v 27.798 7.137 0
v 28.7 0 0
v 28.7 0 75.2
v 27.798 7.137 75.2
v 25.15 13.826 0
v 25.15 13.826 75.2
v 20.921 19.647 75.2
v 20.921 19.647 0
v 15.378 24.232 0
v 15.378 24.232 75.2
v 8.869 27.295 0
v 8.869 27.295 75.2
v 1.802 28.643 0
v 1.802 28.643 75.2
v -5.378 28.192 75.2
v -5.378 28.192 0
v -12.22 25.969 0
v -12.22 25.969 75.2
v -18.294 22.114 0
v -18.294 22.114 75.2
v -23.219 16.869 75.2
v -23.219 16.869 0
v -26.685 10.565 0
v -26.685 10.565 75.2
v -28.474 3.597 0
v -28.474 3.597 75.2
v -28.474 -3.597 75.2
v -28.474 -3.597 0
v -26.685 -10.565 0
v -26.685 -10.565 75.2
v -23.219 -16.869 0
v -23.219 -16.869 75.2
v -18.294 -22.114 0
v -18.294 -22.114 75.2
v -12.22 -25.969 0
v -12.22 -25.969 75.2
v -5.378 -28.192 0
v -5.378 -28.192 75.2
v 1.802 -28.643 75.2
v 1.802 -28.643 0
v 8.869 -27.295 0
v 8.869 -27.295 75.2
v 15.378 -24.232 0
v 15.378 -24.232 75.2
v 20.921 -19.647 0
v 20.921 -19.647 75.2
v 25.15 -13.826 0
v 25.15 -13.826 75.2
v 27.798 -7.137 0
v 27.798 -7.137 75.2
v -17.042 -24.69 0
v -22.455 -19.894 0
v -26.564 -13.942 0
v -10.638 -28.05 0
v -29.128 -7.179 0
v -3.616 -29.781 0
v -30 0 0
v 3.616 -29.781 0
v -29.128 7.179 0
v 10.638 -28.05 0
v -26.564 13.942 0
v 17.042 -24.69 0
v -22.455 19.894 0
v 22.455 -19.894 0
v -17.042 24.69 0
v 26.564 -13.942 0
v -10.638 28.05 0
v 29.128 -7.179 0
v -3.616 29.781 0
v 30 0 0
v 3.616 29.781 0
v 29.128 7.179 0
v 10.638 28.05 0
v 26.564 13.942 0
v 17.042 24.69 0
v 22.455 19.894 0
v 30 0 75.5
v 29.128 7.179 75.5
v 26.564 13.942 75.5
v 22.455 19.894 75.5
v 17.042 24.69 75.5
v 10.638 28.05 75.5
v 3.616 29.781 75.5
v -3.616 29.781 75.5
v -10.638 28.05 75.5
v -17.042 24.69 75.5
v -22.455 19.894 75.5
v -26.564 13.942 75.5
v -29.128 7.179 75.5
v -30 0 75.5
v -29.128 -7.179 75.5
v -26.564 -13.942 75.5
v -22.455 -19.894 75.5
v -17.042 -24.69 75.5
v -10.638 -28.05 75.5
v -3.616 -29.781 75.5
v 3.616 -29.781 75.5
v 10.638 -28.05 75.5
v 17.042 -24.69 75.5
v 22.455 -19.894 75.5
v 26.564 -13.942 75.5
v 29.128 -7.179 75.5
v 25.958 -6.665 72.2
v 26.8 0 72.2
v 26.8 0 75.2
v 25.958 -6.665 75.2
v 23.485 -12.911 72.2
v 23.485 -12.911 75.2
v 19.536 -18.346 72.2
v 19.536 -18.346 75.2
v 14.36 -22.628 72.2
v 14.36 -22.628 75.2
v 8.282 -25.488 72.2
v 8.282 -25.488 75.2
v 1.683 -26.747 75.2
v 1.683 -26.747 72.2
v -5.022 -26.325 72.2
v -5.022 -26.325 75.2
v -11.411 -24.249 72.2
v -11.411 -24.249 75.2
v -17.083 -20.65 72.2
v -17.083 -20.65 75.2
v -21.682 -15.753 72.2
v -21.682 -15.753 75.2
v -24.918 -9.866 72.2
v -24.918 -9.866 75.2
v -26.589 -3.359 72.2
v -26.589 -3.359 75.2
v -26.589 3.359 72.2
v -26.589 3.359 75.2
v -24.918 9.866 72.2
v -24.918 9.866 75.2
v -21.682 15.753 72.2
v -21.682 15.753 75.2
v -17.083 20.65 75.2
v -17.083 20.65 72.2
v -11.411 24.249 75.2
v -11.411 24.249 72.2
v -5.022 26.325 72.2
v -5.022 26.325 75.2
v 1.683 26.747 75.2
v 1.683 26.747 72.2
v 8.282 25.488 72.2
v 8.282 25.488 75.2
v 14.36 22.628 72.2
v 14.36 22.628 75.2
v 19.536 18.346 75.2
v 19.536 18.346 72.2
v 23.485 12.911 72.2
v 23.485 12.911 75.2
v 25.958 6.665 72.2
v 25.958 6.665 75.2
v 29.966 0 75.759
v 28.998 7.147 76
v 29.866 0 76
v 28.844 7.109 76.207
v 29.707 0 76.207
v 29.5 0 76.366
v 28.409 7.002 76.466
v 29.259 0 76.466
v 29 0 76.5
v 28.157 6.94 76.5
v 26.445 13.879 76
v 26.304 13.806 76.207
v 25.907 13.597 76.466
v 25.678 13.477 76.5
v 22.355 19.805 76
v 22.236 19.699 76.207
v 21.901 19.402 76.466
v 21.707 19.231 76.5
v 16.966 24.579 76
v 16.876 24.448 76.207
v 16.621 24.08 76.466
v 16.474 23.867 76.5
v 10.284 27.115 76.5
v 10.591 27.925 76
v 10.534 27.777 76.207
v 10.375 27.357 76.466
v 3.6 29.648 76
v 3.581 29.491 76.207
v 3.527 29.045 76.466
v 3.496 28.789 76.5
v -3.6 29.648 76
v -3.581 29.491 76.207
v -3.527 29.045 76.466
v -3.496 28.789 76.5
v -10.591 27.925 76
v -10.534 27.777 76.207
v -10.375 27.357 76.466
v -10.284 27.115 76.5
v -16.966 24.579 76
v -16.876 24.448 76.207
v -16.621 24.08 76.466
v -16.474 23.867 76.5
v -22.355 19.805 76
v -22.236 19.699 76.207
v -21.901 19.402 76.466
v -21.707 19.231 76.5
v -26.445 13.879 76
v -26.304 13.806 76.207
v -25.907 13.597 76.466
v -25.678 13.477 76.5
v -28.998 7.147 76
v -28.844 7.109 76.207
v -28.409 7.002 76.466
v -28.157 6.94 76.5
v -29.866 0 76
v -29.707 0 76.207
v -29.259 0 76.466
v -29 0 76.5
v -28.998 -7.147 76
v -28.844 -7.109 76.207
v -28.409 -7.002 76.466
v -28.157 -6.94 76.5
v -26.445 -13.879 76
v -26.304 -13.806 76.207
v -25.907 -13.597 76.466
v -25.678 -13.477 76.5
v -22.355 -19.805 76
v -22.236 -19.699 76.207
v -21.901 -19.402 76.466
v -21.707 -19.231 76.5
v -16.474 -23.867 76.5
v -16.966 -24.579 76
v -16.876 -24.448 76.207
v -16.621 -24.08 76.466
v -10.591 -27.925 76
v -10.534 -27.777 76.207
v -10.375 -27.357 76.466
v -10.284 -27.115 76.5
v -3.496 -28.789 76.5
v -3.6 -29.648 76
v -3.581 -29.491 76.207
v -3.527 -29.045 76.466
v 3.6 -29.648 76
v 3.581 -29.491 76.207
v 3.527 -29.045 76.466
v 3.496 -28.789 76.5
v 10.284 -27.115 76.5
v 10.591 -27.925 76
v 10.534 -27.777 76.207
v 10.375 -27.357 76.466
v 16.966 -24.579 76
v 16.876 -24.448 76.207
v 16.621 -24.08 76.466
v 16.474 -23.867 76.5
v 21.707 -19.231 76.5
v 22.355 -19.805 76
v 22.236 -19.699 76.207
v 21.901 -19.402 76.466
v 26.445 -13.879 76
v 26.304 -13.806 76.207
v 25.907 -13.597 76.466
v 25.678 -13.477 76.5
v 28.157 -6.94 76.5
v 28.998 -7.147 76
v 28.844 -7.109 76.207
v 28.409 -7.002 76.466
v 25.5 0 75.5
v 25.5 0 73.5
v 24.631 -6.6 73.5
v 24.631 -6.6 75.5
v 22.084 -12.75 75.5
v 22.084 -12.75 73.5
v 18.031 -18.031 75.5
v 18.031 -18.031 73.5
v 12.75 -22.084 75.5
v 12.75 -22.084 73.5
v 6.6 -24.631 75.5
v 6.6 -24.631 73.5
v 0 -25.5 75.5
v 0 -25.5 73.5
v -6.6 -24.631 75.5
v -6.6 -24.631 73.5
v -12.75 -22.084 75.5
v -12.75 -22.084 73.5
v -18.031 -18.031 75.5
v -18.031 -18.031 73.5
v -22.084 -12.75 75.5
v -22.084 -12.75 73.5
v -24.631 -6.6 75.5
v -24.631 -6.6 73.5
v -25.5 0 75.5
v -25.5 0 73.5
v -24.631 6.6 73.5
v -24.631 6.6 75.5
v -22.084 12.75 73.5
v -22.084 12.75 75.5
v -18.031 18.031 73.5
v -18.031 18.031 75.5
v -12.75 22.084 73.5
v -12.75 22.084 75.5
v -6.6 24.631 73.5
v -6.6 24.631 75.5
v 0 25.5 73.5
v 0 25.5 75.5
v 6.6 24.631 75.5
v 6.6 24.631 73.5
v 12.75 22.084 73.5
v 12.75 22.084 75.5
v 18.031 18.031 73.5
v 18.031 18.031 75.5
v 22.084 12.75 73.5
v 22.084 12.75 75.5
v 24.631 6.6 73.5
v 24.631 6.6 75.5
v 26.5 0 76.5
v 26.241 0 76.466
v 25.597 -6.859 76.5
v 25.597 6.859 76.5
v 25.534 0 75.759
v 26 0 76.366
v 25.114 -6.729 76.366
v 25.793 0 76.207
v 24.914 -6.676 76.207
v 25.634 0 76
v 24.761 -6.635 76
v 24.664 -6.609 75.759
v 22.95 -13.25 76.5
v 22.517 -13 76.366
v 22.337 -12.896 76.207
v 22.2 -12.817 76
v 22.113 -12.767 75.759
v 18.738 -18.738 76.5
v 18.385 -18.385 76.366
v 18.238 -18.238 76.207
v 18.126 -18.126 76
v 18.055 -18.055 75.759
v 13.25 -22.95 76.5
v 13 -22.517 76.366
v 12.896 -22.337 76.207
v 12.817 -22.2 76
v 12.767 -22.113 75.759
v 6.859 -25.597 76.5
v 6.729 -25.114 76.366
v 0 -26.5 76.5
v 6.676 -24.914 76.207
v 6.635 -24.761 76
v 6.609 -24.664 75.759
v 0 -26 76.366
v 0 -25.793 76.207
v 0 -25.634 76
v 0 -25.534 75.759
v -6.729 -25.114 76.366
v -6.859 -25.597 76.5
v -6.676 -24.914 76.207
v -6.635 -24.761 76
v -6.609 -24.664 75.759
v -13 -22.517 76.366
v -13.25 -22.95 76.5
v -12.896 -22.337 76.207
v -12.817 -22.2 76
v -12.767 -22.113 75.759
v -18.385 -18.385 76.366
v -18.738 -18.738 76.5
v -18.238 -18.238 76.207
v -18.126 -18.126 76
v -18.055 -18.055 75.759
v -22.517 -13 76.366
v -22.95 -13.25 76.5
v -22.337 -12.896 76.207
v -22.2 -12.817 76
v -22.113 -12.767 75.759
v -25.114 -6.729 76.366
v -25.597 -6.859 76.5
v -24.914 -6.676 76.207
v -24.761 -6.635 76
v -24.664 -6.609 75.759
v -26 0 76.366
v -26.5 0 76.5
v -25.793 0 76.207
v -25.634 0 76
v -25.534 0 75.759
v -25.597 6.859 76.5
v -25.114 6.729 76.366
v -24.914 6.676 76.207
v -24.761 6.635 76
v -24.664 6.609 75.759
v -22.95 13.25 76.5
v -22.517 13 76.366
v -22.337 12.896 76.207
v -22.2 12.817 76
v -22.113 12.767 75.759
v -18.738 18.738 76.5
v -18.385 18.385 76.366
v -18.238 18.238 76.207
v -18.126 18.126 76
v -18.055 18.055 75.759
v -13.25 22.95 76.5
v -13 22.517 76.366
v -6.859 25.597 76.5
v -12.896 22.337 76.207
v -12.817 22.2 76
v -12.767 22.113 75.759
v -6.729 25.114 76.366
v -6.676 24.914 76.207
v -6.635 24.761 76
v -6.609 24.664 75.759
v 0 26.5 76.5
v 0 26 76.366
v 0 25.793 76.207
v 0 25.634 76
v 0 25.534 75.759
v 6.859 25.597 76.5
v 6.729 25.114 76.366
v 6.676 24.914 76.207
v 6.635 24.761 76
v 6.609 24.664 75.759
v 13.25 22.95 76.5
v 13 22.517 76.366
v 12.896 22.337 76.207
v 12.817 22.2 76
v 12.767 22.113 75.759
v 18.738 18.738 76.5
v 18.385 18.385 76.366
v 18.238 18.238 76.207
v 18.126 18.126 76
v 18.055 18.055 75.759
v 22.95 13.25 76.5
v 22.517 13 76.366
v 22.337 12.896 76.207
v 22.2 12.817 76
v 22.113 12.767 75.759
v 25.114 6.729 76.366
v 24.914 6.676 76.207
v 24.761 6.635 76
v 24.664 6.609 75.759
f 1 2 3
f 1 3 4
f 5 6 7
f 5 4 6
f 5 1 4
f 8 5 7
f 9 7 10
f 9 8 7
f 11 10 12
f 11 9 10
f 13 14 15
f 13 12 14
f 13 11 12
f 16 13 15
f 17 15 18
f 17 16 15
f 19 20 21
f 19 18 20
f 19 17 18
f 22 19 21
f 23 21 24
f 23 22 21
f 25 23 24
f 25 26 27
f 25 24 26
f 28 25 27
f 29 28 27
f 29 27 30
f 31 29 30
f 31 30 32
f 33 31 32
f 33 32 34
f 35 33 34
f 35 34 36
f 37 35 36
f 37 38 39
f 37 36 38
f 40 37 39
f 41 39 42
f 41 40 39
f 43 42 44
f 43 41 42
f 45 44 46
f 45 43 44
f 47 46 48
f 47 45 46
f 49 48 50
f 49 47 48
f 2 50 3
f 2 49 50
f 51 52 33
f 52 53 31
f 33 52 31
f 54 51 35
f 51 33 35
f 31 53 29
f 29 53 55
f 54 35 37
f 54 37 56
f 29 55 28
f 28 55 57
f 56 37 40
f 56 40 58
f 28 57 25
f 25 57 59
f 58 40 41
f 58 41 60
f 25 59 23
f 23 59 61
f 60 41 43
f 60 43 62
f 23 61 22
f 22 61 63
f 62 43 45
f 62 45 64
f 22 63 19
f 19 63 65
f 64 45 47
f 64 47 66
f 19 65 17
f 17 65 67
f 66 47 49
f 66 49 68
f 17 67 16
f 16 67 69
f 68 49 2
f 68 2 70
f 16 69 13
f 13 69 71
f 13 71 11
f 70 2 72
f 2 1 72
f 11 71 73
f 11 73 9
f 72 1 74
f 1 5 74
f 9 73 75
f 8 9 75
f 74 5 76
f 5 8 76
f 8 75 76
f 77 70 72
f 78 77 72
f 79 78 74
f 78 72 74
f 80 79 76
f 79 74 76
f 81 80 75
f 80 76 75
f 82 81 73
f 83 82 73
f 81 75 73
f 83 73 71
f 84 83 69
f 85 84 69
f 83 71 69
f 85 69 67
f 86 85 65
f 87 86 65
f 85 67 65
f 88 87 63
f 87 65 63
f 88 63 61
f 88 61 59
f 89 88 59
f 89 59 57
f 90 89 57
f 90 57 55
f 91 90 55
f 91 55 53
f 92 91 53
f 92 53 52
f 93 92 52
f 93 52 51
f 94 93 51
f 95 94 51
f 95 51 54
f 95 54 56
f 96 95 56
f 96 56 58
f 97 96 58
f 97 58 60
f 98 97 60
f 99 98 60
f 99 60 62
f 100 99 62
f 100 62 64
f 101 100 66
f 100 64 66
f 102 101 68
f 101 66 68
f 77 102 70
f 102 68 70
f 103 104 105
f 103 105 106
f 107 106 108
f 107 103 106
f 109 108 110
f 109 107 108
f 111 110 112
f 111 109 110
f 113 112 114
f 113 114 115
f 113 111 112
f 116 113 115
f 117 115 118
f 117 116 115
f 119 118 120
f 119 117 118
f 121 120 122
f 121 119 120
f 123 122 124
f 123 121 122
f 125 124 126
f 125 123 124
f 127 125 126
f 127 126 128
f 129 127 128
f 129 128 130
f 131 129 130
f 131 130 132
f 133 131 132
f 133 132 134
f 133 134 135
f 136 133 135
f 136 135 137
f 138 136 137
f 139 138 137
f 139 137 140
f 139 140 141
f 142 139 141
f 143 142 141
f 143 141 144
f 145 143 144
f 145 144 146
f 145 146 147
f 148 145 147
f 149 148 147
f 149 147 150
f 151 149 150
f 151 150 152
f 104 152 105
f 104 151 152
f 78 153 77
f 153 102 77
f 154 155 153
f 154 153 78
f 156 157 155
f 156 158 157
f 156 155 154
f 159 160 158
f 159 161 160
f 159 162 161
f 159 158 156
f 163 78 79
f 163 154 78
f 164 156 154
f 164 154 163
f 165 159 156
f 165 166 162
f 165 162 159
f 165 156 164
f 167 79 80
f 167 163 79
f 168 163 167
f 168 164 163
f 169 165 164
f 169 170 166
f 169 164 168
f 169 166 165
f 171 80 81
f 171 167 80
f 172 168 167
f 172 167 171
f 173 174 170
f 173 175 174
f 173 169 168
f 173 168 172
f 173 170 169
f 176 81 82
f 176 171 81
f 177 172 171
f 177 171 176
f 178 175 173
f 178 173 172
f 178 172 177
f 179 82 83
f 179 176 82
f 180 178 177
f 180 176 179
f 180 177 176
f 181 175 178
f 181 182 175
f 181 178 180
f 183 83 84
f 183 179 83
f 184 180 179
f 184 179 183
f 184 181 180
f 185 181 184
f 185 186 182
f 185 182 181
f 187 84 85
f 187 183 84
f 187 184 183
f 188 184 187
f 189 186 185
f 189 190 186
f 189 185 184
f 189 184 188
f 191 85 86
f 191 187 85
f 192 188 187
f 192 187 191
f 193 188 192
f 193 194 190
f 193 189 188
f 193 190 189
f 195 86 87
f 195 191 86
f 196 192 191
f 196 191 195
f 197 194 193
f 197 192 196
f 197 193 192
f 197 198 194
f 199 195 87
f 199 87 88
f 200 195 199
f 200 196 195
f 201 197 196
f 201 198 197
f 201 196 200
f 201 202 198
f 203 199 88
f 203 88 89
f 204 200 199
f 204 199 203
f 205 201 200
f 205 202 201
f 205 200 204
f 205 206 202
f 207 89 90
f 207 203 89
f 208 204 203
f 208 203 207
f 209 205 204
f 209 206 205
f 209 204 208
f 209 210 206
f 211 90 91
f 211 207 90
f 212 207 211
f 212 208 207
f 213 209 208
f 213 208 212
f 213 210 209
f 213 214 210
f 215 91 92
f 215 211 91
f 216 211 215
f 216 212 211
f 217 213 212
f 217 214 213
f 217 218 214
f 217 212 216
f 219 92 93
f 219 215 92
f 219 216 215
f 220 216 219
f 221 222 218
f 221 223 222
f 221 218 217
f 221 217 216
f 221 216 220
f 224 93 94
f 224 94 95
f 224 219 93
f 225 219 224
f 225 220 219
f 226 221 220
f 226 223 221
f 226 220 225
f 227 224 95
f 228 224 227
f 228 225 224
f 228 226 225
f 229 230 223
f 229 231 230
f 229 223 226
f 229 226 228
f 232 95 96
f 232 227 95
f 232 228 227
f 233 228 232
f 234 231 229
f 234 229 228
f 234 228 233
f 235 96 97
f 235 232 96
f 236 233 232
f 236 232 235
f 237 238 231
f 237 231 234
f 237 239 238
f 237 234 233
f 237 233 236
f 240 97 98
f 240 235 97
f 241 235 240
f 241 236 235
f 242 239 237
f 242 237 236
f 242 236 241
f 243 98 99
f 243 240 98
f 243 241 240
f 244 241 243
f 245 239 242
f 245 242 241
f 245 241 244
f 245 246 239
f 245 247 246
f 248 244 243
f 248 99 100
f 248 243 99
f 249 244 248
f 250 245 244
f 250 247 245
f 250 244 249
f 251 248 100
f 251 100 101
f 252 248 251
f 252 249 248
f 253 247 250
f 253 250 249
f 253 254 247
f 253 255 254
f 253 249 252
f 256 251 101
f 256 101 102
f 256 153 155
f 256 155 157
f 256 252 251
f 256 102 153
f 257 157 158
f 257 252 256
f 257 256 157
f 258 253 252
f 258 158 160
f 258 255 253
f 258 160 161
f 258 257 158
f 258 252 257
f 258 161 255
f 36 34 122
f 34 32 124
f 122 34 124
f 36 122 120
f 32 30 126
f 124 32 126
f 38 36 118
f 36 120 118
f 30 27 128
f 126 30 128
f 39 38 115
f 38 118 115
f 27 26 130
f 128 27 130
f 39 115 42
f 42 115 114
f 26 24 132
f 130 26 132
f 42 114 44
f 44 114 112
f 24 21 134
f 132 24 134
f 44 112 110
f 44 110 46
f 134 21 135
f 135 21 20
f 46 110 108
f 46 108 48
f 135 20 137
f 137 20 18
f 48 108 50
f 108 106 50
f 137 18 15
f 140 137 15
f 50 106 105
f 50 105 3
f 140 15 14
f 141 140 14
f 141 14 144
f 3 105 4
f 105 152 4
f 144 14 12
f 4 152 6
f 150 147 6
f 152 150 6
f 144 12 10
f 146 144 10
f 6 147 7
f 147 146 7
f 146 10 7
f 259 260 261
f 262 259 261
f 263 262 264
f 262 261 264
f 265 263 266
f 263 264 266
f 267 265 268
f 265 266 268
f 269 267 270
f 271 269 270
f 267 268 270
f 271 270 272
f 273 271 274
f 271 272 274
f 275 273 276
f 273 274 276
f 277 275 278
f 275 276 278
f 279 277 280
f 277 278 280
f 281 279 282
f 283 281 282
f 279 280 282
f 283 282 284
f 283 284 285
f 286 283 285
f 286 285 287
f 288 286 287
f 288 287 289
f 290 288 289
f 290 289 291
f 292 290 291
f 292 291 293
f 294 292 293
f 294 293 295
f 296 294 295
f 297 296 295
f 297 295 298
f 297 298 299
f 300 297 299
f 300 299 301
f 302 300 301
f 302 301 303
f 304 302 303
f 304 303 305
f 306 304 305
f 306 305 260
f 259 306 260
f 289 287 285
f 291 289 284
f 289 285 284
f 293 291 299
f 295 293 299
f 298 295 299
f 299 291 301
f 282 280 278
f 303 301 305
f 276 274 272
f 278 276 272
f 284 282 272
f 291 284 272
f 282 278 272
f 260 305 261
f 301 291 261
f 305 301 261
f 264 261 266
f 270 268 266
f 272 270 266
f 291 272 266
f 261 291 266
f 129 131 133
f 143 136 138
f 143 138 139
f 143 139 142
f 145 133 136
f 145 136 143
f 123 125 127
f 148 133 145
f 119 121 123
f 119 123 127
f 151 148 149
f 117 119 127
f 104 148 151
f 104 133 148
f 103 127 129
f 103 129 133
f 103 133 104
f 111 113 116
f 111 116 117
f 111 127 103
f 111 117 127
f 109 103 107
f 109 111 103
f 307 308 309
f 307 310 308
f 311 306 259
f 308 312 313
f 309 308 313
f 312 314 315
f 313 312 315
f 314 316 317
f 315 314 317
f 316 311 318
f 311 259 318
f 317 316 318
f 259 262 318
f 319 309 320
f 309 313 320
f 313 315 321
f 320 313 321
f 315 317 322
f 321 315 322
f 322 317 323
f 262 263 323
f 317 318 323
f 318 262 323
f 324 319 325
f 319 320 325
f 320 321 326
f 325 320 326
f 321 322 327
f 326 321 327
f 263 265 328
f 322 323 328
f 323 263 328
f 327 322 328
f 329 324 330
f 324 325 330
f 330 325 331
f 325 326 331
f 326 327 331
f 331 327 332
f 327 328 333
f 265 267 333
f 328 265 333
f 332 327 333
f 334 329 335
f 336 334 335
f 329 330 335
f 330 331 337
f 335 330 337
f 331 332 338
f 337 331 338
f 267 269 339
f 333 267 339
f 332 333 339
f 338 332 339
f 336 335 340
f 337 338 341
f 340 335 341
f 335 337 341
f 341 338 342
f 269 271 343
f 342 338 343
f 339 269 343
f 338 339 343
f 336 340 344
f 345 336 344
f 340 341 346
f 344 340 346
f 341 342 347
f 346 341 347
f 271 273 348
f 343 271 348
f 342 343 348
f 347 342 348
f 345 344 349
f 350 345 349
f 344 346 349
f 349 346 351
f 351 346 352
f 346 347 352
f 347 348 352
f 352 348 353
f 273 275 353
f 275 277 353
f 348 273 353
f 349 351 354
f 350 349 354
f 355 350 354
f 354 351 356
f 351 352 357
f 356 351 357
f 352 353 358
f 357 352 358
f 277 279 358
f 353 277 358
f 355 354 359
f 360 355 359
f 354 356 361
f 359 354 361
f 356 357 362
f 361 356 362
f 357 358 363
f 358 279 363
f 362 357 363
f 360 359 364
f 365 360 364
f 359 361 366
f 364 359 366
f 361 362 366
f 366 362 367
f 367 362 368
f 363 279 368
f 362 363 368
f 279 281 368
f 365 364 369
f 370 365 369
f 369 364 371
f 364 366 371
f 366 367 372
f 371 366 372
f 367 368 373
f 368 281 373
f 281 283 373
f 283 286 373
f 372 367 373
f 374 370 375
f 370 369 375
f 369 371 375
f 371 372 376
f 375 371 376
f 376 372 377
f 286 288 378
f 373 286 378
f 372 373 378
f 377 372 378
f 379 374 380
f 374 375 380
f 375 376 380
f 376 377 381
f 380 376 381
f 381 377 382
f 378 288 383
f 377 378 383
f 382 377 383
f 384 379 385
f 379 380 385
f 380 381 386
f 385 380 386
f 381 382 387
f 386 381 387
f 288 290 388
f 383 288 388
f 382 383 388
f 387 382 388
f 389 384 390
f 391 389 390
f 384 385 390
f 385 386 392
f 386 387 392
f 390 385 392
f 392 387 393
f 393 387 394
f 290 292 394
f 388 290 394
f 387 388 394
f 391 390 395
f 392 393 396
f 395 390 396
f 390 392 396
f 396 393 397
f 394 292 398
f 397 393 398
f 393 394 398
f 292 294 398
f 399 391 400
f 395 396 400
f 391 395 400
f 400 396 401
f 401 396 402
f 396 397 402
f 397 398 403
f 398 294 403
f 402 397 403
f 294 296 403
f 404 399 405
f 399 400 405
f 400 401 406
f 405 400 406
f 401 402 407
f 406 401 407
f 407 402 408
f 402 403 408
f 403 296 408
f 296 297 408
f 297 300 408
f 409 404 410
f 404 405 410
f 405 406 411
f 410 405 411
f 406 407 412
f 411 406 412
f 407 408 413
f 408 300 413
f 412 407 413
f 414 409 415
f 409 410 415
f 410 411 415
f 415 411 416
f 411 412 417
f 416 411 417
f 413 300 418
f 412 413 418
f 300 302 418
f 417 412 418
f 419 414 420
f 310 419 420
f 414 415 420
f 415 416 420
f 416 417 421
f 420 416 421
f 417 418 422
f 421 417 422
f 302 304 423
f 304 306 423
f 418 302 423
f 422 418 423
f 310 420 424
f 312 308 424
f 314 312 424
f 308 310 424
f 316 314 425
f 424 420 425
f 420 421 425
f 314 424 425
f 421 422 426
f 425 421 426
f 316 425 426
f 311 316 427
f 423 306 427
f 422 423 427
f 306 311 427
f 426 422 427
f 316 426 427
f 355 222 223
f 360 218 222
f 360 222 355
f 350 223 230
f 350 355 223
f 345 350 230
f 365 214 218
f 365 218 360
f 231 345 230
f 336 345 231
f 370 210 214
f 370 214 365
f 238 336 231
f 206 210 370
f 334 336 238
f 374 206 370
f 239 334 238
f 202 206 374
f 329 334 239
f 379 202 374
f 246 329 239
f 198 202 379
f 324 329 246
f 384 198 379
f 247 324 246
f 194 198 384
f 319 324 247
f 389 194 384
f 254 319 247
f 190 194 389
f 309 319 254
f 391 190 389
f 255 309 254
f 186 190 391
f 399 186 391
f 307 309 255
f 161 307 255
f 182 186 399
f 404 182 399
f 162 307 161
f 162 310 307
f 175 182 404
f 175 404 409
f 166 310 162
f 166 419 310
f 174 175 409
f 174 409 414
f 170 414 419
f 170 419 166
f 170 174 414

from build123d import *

# Parameters (mm, degrees)
F0_R     = 30
F1_DEPTH = 73
F2_DEPTH = 3.5
F5_D     = 51
F5_DEPTH = 3.5
F5_TIP   = 15.3219457852
F6_R     = 1
F7_T     = -1.3


with BuildPart() as f1:
    # F0 (on Top) → F1 (new body)
    with BuildSketch(Plane.XY):
        Circle(F0_R)
    extrude(amount=F1_DEPTH)

    # F2 (add): a face of the model
    f2_faces = [f1.faces().sort_by_distance(p)[0] for p in [
        (0, 0, 73),
    ]]
    extrude(f2_faces, amount=F2_DEPTH)

    # F5 (one way)
    with BuildSketch(Plane(origin=(0, 0, 73.5), x_dir=(1, 0, 0), z_dir=(0, 0, -1))):
        with Locations((0, 0)):
            Circle(F5_D / 2)
    extrude(amount=-F5_DEPTH, mode=Mode.SUBTRACT)
    with Locations(Plane(origin=(0, 0, 73.5), x_dir=(1, 0, 0), z_dir=(0, 0, -1))):
        with Locations((0, 0)):
            with Locations((0, 0, -(F5_DEPTH + F5_TIP / 2))):  # 118° drill point
                Cone(0, F5_D / 2, F5_TIP, mode=Mode.SUBTRACT)

    # F6
    f6_edges = [f1.edges().sort_by_distance(p)[0] for p in [
        (-30, 0, 76.5),
        (-25.5, 0, 76.5),
    ]]
    fillet(f6_edges, radius=F6_R)

    # F7
    f7_openings = [f1.faces().sort_by_distance(p)[0] for p in [
        (0, 0, 0),
    ]]
    offset(amount=F7_T, openings=f7_openings, kind=Kind.INTERSECTION)


solid = f1.part
